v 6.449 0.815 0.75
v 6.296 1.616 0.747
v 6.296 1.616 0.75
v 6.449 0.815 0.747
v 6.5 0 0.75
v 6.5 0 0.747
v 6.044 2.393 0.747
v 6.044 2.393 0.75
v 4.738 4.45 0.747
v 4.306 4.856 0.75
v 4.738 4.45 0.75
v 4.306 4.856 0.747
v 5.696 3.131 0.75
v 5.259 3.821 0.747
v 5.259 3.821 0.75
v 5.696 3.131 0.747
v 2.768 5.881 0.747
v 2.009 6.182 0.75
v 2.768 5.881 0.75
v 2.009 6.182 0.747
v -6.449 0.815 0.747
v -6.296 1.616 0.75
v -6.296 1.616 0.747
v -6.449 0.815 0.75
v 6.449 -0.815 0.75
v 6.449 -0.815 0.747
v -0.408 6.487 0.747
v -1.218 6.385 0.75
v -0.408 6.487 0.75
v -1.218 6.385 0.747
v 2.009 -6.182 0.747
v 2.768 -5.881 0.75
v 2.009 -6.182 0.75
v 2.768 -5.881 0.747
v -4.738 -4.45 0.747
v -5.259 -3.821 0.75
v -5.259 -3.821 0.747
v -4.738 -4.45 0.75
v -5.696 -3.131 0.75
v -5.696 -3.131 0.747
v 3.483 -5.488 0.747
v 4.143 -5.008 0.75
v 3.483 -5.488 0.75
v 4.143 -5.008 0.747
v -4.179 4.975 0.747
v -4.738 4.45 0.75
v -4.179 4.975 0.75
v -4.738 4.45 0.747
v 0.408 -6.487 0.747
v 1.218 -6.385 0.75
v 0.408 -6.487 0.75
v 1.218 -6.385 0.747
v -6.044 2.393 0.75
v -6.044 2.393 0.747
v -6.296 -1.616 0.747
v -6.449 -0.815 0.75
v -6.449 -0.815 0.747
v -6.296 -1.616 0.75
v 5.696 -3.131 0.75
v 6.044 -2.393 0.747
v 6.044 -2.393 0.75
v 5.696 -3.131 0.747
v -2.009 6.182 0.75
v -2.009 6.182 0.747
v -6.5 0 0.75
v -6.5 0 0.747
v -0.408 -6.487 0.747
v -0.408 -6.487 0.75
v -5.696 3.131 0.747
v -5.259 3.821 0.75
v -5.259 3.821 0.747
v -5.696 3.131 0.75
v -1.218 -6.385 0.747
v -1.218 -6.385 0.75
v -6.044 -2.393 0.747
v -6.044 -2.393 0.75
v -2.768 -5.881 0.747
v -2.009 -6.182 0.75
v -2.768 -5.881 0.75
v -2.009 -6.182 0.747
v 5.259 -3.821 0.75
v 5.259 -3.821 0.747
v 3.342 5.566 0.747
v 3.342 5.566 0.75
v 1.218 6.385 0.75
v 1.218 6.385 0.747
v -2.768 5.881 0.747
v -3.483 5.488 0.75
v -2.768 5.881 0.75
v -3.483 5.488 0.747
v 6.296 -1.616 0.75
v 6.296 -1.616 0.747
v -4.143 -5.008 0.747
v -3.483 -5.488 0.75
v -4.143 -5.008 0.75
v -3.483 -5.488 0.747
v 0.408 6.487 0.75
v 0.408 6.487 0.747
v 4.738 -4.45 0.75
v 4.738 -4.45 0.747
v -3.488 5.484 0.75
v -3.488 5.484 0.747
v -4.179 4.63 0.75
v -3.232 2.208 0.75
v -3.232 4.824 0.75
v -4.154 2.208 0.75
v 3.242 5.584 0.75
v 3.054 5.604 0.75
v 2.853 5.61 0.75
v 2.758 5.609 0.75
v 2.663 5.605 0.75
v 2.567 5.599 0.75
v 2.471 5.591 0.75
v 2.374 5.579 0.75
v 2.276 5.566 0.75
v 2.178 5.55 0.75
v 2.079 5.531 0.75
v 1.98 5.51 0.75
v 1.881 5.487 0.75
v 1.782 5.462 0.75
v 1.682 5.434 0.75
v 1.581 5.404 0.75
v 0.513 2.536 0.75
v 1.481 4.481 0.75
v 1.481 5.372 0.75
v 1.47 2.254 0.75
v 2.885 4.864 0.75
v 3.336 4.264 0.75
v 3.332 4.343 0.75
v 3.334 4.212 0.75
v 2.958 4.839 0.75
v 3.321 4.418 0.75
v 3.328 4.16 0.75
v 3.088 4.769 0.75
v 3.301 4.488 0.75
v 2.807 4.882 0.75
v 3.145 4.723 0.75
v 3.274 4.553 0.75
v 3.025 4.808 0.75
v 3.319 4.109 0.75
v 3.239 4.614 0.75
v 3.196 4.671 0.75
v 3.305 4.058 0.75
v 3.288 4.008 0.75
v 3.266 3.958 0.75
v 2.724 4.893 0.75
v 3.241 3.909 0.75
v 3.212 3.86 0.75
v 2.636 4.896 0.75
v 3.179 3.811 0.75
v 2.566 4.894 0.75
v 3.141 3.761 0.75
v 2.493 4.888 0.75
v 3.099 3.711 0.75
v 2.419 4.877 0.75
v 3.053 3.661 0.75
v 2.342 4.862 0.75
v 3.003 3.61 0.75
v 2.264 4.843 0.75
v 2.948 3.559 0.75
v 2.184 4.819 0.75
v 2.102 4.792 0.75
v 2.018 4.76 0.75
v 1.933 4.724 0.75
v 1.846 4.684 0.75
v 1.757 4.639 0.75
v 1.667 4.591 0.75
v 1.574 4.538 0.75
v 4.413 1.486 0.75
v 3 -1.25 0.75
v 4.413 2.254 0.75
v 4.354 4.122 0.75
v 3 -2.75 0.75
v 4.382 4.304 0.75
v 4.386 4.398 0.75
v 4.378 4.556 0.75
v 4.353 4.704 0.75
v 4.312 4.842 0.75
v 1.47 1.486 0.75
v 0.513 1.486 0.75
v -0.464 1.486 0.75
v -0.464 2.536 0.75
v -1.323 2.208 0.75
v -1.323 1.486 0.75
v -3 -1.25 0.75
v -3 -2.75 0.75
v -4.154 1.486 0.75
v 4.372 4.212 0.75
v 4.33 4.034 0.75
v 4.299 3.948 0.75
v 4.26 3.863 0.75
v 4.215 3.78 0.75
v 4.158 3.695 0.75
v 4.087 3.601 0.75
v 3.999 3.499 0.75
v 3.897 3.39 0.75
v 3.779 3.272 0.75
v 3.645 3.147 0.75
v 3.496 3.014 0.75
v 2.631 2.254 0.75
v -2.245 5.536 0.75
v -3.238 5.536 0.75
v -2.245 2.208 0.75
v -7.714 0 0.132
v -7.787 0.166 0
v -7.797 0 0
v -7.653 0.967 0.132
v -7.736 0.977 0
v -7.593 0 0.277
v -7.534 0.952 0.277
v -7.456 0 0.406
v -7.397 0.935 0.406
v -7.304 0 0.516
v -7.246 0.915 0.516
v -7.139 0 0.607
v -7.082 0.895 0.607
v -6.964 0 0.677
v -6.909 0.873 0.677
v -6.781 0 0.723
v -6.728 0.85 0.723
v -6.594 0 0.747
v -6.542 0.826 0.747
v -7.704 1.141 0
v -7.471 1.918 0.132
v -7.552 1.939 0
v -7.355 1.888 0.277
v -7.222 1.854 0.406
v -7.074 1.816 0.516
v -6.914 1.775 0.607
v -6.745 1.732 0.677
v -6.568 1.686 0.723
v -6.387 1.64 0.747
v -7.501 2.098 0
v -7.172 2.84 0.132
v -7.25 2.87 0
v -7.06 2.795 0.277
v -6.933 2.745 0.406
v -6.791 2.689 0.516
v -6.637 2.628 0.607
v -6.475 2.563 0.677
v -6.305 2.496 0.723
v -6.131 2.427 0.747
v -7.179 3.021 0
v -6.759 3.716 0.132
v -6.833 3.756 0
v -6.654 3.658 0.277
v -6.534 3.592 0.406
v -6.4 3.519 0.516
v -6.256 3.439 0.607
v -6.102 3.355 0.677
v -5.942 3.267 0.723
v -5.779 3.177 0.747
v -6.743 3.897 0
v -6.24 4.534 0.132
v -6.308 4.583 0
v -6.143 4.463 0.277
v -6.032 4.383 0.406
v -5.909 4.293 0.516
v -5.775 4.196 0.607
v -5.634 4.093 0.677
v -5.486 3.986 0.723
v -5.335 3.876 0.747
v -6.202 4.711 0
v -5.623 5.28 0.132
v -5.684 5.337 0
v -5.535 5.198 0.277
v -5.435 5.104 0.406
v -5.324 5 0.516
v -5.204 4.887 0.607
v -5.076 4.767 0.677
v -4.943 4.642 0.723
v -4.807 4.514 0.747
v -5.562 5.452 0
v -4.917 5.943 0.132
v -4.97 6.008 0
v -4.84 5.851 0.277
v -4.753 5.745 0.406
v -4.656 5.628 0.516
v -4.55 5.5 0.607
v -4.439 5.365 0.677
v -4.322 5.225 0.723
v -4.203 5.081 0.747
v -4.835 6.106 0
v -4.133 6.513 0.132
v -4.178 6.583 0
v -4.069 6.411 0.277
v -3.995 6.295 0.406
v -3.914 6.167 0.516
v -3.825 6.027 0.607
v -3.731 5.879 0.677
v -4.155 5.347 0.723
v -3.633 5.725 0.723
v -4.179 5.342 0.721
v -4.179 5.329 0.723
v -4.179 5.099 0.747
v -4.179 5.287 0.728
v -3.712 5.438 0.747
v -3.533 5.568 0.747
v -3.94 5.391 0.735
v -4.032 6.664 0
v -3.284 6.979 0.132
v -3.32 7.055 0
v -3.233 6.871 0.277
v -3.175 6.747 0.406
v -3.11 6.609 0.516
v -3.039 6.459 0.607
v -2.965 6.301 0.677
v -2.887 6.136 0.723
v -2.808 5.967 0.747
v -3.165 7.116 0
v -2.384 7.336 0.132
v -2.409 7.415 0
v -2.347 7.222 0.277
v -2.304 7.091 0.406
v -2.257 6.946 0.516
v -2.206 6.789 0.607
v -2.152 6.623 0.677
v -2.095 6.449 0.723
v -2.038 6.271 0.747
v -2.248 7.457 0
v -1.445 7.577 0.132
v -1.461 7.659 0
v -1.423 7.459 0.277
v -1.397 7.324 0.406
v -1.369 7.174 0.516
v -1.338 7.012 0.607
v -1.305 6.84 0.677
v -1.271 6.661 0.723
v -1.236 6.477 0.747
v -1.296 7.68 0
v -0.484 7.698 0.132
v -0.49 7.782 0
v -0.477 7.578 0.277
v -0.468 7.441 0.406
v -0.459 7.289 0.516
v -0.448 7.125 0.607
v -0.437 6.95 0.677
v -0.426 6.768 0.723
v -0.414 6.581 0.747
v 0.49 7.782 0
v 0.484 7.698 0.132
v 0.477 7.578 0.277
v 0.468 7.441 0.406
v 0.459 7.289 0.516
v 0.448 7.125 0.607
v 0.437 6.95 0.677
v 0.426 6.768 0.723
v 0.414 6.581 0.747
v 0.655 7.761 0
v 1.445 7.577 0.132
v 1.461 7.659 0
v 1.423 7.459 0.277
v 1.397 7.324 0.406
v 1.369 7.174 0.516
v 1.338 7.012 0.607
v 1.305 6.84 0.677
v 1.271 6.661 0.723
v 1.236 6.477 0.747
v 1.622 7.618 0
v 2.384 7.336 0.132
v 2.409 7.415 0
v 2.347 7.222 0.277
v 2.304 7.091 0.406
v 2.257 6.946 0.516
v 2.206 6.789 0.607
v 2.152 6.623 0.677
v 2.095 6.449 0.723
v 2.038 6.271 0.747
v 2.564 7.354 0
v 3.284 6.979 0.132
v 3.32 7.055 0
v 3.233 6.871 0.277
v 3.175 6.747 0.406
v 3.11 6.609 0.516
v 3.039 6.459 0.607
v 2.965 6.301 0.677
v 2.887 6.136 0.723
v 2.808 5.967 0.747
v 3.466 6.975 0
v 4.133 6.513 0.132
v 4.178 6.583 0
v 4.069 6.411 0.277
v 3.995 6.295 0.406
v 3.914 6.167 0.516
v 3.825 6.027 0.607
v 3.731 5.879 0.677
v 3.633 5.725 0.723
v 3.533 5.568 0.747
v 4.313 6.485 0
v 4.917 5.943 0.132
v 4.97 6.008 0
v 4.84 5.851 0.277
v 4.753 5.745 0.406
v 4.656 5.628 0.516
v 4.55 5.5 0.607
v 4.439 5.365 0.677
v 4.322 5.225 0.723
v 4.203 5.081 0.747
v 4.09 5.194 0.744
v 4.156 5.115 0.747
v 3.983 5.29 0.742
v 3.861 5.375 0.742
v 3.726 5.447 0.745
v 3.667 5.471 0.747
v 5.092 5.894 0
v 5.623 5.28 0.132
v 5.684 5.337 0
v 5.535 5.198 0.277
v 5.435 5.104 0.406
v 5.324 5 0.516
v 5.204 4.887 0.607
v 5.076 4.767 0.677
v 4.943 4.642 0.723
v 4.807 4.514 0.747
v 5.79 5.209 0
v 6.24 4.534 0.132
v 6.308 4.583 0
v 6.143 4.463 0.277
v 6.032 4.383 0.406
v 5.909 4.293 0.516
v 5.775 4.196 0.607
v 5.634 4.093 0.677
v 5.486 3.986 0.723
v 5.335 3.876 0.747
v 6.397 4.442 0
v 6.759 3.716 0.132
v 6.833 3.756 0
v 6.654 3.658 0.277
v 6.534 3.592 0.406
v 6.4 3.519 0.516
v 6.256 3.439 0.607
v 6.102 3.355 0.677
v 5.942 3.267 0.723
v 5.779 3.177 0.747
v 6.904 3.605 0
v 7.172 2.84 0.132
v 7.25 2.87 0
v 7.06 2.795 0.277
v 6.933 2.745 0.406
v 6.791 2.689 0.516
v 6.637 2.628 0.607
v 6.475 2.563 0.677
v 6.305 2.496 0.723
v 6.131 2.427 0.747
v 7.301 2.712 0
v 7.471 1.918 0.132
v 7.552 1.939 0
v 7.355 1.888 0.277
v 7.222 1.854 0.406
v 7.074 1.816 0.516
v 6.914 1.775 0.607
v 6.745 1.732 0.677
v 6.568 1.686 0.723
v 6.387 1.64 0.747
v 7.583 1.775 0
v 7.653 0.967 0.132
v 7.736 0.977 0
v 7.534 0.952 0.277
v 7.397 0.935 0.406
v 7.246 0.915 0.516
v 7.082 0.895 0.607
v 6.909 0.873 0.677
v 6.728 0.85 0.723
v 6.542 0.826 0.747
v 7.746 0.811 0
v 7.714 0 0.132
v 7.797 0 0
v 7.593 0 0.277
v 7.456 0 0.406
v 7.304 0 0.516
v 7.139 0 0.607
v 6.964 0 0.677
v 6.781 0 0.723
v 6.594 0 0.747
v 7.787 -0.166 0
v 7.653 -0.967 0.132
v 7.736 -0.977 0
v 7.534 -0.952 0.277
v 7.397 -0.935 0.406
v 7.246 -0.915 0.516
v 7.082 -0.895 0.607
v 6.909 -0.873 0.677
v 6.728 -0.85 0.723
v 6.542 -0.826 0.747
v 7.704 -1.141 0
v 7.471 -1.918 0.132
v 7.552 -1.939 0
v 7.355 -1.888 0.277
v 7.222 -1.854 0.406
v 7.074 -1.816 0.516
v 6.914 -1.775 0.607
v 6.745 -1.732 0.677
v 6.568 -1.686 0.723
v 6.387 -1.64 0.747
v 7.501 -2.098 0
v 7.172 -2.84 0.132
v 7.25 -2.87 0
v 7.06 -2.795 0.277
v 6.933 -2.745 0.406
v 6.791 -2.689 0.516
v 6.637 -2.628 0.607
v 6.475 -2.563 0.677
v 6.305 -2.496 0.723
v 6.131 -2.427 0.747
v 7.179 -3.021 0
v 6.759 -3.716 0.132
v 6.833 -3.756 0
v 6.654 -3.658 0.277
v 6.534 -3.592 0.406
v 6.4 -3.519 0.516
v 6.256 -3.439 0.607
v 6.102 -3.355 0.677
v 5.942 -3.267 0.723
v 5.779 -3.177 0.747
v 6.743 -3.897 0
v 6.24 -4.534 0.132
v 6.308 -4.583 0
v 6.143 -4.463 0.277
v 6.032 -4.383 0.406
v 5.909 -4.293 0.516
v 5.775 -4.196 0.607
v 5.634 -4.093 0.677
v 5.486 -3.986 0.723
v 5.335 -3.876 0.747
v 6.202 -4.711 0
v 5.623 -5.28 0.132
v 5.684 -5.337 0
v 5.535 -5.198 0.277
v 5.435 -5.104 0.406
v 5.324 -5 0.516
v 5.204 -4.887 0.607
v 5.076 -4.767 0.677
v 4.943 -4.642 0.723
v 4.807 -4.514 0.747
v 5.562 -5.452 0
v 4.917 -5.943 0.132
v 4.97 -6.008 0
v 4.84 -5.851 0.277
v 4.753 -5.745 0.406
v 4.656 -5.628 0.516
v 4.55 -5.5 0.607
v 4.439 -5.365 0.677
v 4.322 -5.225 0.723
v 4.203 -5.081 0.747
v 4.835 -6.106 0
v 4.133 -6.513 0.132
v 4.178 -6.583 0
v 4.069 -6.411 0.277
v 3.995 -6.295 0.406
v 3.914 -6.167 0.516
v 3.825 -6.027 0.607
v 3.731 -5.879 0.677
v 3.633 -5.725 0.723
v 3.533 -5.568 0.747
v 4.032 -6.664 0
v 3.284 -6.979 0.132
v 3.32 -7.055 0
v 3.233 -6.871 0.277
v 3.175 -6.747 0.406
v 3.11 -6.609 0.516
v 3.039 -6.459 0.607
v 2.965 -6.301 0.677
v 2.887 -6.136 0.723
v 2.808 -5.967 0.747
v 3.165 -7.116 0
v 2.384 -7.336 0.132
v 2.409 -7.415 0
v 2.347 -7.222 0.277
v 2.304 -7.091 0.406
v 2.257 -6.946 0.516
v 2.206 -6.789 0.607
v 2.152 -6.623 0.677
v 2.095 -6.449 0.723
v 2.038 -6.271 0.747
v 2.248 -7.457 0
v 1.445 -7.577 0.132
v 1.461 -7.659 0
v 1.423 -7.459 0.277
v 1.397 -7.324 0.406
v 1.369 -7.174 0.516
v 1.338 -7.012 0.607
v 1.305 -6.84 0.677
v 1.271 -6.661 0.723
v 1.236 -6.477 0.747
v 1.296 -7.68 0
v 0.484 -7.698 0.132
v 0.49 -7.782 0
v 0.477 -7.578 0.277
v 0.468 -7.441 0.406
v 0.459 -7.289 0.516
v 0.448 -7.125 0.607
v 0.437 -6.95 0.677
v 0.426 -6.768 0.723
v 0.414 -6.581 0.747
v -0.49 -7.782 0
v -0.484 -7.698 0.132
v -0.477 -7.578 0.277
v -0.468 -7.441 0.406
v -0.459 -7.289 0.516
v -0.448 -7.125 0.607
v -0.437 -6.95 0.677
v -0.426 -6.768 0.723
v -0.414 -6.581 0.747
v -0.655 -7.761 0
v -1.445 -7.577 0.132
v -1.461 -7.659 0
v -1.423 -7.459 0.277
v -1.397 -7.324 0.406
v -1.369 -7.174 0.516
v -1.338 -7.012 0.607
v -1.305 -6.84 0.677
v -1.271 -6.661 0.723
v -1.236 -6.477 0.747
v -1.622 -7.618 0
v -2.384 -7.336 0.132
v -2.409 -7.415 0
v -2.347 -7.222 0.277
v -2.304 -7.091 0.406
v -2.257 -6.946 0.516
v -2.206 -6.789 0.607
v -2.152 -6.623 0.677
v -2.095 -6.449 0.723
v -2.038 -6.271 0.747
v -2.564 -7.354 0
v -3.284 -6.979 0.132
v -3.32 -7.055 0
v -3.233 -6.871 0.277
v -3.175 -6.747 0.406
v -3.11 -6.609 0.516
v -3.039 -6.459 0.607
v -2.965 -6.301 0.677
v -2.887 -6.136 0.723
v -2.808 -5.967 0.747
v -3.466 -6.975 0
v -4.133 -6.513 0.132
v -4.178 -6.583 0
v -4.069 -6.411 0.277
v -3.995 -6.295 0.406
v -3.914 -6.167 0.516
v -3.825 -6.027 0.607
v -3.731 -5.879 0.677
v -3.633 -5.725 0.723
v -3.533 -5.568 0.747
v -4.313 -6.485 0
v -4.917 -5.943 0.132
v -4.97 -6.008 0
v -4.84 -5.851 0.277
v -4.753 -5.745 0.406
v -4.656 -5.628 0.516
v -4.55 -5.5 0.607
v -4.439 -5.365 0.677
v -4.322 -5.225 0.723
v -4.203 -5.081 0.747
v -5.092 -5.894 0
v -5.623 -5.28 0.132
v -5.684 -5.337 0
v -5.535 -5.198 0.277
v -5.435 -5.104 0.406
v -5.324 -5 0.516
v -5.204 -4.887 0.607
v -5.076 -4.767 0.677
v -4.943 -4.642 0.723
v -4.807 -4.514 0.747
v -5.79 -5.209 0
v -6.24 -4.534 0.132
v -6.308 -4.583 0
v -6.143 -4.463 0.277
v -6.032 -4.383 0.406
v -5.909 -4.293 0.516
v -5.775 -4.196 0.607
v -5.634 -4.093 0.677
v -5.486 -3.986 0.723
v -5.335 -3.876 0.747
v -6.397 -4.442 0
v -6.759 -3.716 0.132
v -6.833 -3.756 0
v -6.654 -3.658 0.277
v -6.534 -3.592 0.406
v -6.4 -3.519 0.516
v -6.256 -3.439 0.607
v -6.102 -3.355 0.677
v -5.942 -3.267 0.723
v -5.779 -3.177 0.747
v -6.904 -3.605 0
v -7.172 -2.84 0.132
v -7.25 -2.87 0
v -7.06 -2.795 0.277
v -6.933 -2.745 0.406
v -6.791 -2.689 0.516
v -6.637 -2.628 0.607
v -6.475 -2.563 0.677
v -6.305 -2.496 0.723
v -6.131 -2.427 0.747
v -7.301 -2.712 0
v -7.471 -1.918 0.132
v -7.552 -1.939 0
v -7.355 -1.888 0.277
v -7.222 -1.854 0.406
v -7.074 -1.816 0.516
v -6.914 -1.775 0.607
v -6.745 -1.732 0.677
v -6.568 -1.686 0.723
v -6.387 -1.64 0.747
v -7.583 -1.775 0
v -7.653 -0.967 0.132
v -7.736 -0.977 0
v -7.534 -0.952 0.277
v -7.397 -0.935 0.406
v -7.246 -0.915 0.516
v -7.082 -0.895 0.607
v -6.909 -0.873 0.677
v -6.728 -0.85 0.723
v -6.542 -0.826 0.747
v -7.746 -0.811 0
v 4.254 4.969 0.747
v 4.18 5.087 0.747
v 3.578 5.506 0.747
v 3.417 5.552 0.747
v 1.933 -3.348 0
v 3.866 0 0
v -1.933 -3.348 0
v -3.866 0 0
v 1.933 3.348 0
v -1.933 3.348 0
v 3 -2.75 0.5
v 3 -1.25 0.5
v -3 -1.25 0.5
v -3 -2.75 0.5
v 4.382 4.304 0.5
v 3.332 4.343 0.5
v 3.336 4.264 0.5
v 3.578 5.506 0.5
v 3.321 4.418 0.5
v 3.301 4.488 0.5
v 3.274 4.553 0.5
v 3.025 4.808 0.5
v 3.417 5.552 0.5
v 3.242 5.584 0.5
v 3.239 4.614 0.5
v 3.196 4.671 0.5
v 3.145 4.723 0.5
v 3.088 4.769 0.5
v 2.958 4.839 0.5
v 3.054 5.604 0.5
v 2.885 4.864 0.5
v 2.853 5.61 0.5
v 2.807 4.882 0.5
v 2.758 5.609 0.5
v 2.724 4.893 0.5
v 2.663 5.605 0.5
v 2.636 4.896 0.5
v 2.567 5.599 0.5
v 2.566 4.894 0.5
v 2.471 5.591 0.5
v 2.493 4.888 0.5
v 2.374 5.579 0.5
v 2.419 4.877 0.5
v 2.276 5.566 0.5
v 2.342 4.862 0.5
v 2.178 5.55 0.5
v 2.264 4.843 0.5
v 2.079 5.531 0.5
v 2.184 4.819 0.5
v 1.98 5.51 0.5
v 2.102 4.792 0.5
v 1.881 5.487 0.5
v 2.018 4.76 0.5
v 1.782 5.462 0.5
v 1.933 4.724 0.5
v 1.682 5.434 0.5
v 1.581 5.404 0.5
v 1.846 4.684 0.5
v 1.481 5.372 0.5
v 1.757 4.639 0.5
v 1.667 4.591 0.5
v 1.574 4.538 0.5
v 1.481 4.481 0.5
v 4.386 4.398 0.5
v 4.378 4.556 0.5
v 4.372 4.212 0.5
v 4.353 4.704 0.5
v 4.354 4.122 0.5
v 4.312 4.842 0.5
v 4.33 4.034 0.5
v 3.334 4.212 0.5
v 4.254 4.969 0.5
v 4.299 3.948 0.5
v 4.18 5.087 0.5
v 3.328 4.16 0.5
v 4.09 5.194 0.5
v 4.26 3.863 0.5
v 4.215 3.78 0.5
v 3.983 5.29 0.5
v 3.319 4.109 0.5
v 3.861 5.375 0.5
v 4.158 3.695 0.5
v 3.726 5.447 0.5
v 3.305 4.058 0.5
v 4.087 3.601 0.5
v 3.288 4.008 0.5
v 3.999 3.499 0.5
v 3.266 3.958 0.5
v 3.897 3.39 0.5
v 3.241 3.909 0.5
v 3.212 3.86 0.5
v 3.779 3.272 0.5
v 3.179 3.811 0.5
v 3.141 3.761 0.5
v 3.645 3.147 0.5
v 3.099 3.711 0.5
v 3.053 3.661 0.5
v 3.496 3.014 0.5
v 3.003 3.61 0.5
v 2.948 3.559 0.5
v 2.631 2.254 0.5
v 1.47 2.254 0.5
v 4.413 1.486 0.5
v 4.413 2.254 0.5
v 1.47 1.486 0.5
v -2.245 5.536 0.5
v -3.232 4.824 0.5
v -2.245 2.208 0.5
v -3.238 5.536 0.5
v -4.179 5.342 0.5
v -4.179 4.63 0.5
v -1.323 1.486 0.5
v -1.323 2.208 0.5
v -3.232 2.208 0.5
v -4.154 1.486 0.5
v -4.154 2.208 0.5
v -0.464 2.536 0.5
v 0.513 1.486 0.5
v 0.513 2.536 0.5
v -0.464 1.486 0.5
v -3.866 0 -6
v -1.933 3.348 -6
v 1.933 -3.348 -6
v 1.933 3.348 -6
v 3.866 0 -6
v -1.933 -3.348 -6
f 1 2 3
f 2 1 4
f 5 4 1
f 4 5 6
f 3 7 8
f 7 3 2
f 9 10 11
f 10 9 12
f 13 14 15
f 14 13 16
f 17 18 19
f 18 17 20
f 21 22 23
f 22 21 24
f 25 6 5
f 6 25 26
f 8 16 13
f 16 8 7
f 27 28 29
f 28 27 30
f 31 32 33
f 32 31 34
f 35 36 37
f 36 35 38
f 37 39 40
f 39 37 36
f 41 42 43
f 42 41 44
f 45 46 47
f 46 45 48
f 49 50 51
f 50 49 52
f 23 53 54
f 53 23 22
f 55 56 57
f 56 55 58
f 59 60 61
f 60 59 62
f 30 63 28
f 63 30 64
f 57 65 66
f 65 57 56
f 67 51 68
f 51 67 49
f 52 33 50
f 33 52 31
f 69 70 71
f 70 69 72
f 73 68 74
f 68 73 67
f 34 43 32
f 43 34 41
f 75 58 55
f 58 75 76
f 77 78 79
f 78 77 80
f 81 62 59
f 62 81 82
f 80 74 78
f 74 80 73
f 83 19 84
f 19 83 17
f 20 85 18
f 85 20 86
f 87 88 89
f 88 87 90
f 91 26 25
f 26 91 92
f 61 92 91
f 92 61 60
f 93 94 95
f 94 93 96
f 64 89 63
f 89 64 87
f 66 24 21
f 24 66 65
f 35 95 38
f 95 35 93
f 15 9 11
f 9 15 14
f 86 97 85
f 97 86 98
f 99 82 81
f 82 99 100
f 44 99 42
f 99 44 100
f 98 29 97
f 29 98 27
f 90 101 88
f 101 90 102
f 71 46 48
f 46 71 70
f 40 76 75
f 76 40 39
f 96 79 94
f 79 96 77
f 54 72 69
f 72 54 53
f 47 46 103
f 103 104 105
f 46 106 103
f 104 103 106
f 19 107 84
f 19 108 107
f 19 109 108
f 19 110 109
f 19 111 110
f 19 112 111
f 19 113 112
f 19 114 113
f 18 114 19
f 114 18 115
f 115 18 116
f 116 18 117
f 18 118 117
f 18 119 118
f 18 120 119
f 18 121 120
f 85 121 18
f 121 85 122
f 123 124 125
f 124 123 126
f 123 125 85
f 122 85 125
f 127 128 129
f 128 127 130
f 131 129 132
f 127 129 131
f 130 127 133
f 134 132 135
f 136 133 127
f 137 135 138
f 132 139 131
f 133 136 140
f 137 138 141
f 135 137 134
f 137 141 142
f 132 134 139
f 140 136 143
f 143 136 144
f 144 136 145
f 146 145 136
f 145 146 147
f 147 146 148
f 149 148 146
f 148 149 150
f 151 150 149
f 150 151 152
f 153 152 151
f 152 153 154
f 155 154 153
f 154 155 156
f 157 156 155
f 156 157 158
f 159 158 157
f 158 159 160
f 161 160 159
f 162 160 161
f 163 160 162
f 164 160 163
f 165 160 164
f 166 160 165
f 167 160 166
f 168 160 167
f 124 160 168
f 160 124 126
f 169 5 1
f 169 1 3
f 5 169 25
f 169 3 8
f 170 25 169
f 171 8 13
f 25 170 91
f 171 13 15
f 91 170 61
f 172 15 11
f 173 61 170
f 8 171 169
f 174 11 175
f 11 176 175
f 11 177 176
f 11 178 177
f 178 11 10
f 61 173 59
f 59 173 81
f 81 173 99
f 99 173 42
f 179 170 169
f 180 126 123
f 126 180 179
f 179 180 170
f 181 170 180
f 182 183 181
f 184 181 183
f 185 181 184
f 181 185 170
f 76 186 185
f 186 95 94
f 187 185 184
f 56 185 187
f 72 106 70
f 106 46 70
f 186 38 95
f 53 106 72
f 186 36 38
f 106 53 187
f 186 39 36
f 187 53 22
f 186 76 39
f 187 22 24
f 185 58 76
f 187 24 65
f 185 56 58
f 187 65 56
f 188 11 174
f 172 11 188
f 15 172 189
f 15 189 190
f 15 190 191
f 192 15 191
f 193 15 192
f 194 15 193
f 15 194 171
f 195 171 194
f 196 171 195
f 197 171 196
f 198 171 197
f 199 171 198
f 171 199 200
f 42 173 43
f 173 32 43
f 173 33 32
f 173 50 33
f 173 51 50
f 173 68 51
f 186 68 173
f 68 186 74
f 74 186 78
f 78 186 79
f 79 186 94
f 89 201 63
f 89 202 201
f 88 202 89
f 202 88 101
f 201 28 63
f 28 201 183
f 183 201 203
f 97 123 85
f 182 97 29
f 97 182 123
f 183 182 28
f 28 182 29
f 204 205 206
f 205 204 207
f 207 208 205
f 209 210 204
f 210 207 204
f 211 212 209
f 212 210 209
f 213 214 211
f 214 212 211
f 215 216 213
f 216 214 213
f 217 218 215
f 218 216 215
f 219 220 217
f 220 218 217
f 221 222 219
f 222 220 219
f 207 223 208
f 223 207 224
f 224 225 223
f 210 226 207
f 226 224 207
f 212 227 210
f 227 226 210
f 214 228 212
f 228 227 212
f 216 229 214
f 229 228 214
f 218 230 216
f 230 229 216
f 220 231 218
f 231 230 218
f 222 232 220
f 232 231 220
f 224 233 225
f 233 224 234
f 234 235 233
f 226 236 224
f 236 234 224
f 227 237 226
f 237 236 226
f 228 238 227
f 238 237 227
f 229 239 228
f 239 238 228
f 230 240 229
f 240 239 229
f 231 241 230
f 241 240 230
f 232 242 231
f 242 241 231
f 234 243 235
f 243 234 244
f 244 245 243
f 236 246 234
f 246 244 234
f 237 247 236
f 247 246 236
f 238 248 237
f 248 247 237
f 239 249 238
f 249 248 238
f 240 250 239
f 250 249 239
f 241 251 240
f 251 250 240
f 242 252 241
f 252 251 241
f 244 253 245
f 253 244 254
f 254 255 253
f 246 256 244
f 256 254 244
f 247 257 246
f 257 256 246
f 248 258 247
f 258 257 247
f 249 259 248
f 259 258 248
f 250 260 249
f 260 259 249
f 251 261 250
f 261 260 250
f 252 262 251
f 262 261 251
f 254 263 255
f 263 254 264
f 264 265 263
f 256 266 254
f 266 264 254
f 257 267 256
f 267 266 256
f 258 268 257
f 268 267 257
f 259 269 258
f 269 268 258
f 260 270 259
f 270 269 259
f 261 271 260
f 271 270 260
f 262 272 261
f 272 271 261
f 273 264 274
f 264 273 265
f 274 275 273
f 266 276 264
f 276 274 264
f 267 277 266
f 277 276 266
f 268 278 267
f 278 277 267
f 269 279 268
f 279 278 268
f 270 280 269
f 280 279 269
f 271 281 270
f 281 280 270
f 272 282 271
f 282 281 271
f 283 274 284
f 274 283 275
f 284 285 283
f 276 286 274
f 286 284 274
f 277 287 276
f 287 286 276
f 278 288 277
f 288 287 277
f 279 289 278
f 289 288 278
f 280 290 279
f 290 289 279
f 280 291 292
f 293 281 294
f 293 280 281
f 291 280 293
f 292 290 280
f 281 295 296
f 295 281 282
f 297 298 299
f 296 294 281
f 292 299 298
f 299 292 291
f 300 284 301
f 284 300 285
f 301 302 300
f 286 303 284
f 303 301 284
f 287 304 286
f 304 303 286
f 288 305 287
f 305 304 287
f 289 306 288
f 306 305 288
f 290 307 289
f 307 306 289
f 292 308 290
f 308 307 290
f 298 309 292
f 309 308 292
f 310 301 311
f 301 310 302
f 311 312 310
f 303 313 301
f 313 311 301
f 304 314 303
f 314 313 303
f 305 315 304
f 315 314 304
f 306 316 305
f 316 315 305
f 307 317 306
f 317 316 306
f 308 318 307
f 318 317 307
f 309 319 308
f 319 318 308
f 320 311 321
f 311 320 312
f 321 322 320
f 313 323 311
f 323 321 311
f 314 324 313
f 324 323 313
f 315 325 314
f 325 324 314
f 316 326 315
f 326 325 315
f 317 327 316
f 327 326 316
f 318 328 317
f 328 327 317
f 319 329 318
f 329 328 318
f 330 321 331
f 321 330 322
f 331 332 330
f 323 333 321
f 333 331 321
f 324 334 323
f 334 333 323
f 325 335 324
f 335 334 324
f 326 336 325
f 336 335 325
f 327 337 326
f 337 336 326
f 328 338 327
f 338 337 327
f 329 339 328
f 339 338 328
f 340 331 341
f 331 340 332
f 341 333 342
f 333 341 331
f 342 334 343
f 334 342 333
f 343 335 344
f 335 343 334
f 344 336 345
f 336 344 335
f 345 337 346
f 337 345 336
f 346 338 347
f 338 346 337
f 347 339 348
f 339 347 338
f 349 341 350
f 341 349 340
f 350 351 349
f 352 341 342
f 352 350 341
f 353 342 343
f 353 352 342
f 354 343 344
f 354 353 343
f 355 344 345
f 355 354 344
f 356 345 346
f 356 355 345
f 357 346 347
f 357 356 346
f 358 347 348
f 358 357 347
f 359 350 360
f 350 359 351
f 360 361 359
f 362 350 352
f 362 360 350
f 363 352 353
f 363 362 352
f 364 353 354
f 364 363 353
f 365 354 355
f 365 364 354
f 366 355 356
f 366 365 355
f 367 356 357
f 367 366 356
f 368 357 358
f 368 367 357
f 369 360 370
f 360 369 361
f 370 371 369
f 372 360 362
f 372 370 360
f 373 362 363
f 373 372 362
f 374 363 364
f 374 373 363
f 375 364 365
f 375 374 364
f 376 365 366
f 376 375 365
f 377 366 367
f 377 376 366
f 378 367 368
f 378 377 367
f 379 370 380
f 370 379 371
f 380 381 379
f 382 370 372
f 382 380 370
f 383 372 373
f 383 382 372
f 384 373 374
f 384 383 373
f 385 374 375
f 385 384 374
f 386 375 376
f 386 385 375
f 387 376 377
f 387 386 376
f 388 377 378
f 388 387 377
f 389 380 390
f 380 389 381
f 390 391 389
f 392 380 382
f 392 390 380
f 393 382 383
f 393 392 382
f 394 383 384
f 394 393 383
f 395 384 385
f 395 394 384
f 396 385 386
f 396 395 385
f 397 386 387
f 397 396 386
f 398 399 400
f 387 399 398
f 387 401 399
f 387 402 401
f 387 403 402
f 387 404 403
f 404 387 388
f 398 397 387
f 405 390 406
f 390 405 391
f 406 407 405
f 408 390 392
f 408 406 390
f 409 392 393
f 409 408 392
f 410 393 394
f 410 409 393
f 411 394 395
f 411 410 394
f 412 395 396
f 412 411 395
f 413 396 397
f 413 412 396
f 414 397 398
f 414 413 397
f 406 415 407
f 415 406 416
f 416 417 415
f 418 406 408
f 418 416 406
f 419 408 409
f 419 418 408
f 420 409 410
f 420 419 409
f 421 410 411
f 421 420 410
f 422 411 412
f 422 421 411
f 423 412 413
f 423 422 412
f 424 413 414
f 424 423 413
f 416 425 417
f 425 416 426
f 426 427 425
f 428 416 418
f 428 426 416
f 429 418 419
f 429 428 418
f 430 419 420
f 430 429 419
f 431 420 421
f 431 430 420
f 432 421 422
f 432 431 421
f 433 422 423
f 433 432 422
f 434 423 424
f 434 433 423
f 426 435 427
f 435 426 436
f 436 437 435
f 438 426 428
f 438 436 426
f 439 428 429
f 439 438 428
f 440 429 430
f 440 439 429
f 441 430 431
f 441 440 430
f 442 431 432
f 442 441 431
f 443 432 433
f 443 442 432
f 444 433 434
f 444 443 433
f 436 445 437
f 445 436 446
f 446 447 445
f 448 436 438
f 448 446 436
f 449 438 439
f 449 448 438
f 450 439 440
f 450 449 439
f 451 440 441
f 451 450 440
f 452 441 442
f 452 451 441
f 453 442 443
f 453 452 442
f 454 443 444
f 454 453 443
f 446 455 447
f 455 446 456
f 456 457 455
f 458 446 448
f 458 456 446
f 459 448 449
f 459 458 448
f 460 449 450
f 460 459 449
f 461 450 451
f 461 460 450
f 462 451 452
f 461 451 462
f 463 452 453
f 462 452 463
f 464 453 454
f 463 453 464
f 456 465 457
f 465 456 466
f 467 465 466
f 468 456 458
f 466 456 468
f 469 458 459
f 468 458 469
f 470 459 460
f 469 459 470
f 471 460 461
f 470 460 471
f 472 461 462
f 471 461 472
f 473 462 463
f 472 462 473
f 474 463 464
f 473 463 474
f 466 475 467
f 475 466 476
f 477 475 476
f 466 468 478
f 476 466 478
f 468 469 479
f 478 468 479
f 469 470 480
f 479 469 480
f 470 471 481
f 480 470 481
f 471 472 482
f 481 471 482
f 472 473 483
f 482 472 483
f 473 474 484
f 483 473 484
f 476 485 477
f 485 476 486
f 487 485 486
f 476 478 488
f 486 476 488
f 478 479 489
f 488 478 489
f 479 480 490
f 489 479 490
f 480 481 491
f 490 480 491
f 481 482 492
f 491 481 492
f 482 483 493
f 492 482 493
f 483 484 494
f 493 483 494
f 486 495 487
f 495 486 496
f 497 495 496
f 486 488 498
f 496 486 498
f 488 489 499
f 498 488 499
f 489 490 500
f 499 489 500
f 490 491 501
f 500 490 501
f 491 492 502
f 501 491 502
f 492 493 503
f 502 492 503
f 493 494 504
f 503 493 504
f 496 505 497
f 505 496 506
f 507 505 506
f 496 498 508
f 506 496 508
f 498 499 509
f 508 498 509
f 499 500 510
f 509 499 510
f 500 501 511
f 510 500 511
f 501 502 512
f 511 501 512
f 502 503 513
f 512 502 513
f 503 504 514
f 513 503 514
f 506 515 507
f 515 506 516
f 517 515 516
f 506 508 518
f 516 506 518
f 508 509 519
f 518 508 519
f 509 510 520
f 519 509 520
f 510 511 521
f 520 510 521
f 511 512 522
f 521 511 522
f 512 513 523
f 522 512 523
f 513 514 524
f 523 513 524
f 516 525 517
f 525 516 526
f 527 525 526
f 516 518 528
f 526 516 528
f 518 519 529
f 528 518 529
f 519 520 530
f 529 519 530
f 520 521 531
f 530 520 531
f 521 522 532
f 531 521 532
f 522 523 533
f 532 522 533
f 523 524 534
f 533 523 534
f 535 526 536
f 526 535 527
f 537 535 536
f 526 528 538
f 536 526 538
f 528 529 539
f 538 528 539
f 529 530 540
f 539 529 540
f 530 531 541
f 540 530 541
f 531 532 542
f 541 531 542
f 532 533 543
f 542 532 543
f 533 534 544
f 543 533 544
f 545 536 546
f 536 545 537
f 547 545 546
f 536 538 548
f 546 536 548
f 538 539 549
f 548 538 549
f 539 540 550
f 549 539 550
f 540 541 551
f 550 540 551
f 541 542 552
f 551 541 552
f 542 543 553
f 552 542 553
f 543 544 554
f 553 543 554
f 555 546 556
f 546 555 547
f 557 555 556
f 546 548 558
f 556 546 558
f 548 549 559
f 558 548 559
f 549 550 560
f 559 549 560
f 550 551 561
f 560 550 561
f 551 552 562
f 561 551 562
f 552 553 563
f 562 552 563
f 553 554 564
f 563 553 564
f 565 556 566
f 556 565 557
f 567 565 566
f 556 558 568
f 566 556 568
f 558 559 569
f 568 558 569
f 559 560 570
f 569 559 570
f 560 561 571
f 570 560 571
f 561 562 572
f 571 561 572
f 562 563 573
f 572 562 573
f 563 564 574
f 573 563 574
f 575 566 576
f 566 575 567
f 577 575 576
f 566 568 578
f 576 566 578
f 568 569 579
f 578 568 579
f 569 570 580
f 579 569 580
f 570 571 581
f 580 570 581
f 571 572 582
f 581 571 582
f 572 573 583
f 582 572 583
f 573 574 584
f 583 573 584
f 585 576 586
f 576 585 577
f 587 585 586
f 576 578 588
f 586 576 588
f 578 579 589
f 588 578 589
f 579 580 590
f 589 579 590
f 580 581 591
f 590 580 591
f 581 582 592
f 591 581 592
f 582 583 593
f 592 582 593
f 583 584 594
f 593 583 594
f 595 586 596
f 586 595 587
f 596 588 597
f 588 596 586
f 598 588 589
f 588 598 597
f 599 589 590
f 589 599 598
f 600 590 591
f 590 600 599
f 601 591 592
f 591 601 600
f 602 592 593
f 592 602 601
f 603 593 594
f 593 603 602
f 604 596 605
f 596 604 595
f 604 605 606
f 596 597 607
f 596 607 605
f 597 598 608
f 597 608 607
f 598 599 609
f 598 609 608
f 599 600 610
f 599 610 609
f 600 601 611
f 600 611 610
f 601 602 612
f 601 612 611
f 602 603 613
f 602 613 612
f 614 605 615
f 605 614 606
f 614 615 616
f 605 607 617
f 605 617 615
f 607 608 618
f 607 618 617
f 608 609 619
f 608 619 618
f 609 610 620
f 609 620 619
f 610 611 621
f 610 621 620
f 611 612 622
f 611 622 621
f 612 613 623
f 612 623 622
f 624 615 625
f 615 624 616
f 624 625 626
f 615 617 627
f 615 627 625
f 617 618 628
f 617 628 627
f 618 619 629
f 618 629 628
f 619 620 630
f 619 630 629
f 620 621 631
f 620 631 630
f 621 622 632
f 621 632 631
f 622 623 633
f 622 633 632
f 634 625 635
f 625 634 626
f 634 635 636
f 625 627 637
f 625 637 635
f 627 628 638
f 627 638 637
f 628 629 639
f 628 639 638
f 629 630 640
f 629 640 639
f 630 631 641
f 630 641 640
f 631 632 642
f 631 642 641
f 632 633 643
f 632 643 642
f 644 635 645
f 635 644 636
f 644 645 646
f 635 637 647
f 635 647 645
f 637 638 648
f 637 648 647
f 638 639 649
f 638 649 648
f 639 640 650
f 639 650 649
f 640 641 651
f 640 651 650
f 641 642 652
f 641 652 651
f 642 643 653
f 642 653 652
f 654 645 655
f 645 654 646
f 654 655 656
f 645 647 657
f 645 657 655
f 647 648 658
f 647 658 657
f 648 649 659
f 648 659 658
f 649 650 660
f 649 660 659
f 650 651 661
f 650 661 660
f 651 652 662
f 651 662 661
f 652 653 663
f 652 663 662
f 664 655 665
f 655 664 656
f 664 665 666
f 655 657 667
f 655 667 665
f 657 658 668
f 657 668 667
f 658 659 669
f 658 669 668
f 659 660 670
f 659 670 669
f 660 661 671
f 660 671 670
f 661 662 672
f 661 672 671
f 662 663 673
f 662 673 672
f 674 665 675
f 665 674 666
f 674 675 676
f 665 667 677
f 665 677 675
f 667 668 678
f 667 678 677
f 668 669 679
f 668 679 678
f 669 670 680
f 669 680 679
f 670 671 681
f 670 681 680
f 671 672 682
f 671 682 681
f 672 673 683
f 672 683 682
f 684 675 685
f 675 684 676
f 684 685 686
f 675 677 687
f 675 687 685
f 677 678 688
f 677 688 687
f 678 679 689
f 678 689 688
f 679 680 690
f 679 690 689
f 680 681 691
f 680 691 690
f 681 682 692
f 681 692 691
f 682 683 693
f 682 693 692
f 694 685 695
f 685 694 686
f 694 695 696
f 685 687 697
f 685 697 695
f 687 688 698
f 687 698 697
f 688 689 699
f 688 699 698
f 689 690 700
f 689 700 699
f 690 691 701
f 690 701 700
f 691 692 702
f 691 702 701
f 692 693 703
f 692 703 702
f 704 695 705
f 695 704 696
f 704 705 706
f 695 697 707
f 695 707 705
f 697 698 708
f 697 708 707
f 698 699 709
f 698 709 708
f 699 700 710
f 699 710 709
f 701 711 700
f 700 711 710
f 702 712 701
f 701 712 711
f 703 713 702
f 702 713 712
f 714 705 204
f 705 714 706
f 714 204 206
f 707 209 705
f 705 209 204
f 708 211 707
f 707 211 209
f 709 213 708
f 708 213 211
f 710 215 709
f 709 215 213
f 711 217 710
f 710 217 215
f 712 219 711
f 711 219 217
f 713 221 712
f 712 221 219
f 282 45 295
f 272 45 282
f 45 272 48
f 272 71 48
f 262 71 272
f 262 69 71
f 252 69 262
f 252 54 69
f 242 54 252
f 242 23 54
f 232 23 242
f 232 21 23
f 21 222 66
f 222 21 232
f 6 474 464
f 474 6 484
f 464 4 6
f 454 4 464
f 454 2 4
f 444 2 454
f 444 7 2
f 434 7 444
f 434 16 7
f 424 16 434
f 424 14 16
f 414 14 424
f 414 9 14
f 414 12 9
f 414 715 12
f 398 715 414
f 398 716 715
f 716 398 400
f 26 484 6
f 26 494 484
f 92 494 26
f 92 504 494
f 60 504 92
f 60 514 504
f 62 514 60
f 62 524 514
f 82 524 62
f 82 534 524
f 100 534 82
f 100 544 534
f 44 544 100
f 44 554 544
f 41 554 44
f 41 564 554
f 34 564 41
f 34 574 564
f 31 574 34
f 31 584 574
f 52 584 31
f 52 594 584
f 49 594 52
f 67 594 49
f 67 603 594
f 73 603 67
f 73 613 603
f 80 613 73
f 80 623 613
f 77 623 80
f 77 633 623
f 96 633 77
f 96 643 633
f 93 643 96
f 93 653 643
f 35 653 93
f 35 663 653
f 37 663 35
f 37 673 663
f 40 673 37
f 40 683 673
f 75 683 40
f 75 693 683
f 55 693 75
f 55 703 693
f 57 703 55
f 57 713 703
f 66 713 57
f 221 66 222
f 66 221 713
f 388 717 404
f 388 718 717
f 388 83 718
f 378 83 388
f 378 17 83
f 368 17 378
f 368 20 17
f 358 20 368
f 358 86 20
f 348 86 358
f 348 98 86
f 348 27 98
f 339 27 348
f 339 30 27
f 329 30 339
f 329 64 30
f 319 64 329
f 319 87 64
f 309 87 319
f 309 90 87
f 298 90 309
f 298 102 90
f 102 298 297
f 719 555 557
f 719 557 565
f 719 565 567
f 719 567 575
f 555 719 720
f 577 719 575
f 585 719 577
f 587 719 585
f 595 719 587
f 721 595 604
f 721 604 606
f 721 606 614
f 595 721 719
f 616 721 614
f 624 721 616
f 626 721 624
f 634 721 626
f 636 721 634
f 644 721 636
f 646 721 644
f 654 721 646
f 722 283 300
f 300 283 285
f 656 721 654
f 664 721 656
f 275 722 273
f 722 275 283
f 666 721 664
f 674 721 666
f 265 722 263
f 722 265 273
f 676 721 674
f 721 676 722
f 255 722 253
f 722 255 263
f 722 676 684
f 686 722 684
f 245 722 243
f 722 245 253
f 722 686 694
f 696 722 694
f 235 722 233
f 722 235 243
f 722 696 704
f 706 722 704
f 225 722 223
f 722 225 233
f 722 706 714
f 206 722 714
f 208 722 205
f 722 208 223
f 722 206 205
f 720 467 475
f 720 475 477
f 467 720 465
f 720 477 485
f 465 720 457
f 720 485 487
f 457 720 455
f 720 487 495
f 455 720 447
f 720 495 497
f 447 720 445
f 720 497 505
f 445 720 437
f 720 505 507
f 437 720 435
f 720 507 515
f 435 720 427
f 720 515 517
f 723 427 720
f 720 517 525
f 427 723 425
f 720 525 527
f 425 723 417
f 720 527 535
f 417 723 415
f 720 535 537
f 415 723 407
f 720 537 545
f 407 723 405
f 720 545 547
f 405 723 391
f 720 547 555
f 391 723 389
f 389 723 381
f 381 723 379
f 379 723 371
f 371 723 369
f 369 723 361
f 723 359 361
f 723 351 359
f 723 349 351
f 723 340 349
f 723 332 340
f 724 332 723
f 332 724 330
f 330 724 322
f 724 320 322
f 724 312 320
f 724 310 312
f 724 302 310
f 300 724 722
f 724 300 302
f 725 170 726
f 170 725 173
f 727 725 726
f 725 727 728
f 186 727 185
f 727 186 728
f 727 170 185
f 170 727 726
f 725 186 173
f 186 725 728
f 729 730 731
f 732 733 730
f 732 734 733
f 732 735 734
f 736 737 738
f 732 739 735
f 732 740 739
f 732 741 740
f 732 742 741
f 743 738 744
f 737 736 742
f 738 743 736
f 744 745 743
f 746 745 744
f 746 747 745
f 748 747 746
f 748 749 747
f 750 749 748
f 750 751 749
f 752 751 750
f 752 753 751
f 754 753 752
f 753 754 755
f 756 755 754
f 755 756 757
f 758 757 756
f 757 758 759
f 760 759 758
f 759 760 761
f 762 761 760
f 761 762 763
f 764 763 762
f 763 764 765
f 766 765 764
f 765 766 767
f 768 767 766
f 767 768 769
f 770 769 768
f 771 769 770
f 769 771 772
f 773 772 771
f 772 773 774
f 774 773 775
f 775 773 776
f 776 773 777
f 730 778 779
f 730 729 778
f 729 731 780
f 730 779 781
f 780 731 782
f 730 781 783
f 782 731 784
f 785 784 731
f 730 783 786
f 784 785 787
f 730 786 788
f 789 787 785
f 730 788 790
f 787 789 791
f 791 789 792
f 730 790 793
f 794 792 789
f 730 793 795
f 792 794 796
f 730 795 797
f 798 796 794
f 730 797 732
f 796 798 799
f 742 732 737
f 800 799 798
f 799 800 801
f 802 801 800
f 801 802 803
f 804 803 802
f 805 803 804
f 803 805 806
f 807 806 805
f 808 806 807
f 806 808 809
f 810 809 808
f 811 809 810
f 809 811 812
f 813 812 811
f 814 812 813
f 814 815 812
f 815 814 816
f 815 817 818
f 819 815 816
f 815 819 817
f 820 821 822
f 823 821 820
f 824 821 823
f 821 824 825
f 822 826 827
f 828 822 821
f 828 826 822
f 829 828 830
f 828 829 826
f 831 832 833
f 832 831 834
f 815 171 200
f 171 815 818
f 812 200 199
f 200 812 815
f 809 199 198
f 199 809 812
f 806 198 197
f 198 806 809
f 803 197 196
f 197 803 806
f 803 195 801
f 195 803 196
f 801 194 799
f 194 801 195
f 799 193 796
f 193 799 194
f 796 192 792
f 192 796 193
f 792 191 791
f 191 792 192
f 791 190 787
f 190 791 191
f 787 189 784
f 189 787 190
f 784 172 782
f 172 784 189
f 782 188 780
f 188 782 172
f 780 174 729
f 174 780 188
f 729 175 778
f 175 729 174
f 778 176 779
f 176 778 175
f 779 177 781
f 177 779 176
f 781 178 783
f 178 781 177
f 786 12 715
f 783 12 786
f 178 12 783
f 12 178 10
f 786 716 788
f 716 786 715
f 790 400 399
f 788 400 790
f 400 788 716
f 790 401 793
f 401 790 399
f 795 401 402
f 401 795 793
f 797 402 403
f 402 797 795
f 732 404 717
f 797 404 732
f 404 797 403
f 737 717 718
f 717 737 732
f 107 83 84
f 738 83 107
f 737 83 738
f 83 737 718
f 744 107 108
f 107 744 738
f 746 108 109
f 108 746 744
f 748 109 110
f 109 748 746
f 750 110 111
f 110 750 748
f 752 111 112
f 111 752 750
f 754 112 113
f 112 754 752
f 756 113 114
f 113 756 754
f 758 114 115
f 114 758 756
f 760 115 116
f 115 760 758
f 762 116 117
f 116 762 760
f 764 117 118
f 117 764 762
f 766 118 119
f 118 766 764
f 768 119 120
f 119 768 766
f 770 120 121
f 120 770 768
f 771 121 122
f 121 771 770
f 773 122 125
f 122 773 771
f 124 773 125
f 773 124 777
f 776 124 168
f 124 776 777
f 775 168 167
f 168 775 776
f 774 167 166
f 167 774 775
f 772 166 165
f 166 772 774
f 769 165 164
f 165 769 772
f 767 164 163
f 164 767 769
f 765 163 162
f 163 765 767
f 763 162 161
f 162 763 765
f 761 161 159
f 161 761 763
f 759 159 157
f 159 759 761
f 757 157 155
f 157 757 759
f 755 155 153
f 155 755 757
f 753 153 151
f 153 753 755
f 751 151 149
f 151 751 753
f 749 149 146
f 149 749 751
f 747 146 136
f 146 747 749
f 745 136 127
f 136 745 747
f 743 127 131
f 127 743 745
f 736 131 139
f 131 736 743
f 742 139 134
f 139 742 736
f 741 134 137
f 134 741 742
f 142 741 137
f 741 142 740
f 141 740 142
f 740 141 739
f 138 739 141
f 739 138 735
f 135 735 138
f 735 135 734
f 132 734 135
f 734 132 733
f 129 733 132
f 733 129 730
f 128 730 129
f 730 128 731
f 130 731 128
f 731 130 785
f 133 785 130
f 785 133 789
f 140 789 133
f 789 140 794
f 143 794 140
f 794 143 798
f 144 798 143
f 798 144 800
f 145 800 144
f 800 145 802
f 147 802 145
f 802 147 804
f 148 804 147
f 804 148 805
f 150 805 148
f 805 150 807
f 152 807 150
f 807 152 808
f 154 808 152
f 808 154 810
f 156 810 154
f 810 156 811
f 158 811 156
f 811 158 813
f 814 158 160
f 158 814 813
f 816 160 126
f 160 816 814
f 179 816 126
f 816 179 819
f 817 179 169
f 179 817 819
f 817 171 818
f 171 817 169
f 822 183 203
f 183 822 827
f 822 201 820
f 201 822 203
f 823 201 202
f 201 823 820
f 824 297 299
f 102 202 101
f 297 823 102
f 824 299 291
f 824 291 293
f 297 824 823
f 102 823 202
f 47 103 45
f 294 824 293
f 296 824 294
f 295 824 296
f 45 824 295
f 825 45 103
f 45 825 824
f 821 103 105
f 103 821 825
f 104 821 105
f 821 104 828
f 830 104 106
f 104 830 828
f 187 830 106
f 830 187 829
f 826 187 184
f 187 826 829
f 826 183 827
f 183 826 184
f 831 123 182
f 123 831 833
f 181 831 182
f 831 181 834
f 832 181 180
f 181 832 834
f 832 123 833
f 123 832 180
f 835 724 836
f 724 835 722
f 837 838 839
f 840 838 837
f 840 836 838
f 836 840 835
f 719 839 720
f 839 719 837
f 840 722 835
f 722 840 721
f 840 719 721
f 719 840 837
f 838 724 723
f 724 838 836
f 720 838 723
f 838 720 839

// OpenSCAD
$fn = 50;


union() {
	difference() {
		union() {
			translate(v = [0, 0, -0.7500000000]) {
				cylinder(h = 1.5000000000, r = 6.5000000000);
			}
			translate(v = [0, 0, -0.7500000000]) {
				rotate_extrude(angle = 360) {
					translate(v = [6.5000000000, 0, 0]) {
						circle(r = 1.5000000000);
					}
				}
			}
		}
		union() {
			translate(v = [-25.0000000000, -25.0000000000, -50]) {
				cube(size = [50, 50, 50]);
			}
			#translate(v = [-3.0000000000, -2.7500000000, 0.5000000000]) {
				cube(size = [6, 1.5000000000, 0.2500000000]);
			}
			#translate(v = [0, 3.5000000000, 0.5000000000]) {
				linear_extrude(height = 0.2500000000) {
					text(font = "SegoiUI:Bold", halign = "center", size = 4, text = "1.2", valign = "center");
				}
			}
		}
	}
	union() {
		translate(v = [0, 0, -6]) {
			linear_extrude(height = 6) {
				polygon(points = [[3.8658550000, 0.0000000000], [1.9329275000, 3.3479286373], [-1.9329275000, 3.3479286373], [-3.8658550000, 0.0000000000], [-1.9329275000, -3.3479286373], [1.9329275000, -3.3479286373]]);
			}
		}
	}
}
